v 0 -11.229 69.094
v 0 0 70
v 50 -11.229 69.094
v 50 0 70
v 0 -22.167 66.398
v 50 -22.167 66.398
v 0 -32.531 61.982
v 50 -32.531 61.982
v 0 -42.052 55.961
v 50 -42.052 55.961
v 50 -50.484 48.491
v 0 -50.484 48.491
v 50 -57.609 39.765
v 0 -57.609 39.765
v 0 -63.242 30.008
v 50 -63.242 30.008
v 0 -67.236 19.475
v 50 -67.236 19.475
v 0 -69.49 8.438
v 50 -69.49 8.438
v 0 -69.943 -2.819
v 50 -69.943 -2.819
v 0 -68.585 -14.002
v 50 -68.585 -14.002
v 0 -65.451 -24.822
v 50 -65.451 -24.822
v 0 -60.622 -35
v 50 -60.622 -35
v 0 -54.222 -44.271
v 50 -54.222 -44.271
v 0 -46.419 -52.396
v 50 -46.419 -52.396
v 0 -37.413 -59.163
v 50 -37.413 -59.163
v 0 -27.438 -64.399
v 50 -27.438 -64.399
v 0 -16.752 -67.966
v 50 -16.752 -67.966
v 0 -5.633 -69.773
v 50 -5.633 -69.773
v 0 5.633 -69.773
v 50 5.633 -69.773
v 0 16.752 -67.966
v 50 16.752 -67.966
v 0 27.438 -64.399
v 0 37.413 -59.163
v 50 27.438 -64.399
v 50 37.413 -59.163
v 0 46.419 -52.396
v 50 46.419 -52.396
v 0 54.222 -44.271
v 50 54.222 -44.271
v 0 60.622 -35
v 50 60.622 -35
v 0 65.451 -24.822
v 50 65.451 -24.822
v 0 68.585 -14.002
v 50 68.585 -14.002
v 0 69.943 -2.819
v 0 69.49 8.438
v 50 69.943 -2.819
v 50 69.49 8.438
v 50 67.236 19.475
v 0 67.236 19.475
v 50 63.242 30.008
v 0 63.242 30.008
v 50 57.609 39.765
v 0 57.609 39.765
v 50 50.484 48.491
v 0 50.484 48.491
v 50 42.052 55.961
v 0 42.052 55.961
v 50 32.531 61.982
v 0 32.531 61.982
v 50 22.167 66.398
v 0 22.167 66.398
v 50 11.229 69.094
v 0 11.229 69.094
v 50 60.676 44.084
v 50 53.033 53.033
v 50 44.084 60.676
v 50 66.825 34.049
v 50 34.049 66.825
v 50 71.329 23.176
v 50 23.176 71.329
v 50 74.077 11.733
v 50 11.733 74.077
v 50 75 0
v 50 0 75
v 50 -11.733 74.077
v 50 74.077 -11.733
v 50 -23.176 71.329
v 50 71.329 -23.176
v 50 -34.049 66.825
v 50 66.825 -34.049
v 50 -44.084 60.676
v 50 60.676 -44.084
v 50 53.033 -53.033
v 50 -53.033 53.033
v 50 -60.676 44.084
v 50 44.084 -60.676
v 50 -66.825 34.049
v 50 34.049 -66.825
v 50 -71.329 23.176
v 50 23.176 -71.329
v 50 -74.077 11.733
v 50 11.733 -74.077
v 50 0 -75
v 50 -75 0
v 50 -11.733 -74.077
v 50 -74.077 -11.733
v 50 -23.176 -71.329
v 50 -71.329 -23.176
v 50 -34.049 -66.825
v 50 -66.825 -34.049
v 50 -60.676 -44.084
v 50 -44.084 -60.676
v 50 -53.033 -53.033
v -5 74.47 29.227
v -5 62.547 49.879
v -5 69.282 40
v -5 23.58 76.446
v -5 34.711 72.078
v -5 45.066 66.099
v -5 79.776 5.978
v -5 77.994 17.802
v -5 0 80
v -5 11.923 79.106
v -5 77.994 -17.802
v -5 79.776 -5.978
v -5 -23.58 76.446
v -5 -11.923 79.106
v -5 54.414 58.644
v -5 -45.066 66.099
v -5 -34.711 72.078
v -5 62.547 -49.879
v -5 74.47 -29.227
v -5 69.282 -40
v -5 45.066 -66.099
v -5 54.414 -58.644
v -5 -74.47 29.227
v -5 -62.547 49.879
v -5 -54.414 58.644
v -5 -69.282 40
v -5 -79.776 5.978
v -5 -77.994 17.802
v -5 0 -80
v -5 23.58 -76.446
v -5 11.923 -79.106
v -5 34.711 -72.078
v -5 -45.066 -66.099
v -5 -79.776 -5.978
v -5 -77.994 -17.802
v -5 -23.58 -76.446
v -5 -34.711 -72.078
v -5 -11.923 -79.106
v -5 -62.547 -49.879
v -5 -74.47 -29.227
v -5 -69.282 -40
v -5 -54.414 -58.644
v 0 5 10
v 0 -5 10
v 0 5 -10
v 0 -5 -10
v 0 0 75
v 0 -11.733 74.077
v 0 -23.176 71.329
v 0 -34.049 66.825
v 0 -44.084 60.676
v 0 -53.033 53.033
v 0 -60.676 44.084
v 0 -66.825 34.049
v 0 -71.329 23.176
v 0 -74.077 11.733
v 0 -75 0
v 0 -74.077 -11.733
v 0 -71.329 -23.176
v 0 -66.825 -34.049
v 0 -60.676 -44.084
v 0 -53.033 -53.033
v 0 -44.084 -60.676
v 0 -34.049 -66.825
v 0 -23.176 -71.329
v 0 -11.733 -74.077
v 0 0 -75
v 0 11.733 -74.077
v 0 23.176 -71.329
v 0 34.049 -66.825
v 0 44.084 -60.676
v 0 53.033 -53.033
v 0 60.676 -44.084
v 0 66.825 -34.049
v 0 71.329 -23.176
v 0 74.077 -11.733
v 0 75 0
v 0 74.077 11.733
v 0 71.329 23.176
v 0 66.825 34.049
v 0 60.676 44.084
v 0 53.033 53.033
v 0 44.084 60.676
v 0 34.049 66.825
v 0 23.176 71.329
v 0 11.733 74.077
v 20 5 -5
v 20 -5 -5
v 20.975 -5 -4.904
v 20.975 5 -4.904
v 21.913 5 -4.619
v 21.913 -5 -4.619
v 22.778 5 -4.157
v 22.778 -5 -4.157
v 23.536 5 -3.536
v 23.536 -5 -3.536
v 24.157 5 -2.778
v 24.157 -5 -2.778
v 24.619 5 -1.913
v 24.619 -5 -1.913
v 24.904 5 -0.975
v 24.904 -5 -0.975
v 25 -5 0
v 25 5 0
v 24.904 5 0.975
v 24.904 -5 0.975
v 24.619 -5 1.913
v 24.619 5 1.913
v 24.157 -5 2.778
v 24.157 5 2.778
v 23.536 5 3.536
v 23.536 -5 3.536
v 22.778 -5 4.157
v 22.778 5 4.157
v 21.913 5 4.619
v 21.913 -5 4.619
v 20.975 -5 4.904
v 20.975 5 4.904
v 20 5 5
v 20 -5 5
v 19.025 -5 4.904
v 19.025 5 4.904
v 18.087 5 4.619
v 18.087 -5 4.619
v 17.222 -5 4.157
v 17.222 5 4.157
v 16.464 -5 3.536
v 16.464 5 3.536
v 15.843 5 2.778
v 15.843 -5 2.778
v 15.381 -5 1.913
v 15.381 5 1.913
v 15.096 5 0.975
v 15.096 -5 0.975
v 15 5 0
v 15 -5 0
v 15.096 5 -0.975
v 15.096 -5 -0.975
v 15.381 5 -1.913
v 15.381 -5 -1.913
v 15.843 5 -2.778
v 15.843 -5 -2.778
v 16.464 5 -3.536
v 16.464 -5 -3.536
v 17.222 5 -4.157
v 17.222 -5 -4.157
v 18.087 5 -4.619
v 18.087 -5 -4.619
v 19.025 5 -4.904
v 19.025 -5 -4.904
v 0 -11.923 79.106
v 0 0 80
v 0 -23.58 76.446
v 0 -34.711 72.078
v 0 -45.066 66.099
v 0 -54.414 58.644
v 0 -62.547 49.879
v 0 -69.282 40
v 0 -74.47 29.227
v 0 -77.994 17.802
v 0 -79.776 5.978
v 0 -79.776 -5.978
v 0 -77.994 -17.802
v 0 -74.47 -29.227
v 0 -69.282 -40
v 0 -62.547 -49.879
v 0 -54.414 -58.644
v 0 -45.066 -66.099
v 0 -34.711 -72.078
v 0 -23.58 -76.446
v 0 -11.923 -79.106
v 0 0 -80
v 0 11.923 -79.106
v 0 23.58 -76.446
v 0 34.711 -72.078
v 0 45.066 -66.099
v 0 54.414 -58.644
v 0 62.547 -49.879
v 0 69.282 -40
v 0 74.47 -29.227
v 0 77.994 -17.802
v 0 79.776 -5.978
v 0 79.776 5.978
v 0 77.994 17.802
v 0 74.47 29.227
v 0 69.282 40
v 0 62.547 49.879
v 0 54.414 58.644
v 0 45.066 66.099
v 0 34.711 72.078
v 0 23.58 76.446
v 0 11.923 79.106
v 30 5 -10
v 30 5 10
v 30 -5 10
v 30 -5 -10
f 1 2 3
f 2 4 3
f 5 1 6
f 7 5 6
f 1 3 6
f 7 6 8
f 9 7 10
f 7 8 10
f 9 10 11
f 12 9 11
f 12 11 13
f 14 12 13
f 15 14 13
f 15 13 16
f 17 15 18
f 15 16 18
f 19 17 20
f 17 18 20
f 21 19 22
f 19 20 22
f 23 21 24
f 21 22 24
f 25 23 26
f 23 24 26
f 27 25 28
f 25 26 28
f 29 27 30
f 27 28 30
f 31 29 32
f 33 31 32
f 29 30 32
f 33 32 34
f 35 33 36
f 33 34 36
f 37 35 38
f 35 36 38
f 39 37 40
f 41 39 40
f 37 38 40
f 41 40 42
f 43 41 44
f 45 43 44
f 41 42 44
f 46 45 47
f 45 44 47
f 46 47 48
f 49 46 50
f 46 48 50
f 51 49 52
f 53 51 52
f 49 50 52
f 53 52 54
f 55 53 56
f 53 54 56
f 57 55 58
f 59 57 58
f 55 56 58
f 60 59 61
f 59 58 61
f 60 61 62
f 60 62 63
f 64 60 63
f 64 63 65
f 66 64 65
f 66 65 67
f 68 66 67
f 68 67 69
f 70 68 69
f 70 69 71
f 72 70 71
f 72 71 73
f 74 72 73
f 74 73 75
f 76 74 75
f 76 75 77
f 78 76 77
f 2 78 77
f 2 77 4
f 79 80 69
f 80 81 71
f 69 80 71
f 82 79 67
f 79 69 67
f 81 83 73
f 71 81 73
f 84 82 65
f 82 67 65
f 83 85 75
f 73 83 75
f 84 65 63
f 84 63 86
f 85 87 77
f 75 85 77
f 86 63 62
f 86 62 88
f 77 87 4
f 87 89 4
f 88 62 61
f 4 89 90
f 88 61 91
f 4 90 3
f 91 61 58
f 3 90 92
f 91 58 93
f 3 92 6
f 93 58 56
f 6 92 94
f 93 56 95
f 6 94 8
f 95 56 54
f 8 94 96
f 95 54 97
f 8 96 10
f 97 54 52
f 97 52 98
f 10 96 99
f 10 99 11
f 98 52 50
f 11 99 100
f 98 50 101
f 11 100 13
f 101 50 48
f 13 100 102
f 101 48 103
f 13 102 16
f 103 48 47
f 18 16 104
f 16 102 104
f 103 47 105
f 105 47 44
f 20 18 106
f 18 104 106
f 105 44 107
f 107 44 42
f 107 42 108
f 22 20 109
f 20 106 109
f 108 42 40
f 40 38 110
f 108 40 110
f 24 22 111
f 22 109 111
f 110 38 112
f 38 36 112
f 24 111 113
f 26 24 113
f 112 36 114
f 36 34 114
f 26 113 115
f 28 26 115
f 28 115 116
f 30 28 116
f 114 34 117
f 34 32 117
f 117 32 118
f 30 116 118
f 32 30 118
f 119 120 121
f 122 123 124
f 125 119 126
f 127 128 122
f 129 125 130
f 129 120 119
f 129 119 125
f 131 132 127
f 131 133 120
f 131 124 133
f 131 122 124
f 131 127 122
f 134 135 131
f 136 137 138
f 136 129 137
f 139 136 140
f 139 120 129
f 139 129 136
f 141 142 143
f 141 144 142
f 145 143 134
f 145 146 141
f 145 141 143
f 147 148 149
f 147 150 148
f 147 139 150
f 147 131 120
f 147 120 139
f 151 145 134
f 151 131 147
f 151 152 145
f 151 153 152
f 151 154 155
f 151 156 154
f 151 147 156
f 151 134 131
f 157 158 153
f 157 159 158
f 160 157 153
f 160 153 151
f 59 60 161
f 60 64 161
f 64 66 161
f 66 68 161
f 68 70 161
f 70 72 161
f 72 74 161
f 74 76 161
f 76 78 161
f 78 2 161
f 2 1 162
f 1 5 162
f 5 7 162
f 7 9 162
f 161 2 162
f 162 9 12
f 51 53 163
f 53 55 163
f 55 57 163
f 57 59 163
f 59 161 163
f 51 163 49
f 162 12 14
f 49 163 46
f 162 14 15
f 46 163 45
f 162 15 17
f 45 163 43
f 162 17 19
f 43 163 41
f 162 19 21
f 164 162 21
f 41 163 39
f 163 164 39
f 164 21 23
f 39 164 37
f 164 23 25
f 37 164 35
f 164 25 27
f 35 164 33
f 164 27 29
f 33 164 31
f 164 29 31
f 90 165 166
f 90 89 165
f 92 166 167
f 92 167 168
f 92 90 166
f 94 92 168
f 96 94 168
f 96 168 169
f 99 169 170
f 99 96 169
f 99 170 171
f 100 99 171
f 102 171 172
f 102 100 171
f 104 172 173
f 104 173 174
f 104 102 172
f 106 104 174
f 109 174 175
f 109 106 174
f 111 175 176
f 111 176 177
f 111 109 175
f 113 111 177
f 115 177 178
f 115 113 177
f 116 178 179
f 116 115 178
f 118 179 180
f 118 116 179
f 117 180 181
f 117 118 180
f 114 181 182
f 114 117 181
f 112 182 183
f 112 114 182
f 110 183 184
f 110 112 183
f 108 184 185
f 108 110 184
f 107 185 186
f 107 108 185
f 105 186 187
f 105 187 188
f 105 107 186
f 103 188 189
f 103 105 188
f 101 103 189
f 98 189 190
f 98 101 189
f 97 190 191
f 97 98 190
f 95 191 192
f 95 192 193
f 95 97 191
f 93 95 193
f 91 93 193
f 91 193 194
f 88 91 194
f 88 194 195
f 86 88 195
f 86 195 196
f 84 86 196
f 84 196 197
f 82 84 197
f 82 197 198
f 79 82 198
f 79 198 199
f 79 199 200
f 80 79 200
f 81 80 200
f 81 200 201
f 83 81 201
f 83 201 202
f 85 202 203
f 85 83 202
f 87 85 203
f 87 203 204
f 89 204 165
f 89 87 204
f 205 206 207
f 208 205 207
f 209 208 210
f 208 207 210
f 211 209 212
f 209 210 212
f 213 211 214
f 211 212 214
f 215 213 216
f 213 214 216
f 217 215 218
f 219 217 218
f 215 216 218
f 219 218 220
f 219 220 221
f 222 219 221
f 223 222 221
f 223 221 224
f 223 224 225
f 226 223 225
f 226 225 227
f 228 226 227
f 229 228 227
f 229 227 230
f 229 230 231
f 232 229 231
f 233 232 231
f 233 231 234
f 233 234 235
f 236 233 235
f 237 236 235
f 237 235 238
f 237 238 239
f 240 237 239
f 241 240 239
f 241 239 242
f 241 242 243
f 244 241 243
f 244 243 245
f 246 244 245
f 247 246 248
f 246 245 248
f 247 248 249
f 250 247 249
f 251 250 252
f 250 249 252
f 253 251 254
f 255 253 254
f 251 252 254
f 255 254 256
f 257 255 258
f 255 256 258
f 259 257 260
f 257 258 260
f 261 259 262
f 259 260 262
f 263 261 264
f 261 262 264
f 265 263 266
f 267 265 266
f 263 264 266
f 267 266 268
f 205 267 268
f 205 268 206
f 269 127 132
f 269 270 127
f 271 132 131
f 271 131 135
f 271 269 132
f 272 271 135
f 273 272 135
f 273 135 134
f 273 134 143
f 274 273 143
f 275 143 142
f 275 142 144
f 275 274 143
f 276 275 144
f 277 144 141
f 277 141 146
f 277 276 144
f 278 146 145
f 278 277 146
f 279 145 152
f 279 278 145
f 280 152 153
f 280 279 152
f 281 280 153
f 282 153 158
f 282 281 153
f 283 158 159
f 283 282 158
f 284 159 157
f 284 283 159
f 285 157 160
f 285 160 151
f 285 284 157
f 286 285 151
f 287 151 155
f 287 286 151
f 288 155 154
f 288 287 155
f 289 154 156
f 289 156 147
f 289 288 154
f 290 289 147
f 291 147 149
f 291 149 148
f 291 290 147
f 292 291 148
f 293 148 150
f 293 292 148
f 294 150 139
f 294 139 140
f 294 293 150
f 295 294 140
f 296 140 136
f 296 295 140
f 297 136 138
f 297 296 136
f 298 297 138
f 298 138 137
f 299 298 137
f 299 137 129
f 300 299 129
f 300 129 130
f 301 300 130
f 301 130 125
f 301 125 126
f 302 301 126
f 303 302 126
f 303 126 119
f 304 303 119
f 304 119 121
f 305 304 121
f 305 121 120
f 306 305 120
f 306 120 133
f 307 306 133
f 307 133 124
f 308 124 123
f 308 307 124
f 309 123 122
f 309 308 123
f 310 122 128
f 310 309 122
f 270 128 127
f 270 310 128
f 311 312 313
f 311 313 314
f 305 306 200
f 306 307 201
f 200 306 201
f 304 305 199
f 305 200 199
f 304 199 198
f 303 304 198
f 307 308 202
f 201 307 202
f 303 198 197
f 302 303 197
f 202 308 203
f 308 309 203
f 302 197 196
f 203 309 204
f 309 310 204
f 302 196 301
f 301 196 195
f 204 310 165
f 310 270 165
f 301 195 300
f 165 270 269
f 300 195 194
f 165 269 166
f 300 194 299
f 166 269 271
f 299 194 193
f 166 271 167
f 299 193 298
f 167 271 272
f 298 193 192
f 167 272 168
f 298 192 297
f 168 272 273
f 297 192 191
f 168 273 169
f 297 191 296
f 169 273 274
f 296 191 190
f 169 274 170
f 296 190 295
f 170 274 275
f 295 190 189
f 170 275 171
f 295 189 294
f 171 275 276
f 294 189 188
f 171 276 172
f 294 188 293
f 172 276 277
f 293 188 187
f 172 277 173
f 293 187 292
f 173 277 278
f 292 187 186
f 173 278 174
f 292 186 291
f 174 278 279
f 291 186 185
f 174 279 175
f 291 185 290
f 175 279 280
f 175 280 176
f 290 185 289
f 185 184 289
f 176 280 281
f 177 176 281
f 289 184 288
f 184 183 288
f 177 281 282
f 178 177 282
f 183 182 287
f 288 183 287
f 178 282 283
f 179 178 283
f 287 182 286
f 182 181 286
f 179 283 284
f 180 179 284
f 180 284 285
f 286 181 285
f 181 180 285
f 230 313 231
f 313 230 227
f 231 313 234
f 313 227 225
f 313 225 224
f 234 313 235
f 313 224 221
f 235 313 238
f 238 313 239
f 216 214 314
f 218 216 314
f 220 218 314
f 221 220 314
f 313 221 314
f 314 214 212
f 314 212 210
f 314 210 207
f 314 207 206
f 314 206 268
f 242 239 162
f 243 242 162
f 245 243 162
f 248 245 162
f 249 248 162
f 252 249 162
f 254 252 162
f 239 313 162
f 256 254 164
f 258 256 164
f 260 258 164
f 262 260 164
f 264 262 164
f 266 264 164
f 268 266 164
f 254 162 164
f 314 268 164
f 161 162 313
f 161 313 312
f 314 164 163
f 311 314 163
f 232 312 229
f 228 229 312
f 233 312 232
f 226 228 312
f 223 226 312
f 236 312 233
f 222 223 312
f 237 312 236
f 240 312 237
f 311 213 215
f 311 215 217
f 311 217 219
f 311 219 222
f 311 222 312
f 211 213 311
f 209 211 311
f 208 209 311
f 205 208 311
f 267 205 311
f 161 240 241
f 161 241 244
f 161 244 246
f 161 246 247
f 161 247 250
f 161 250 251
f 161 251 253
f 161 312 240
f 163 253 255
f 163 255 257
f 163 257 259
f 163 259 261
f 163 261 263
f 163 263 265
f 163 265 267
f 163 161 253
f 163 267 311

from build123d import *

# Parameters (mm, degrees)
SKIZZE1_W                       = 5
SKIZZE1_H                       = 80
SKIZZE1_W_2                     = 50
SKIZZE1_H_2                     = 5
SKIZZE2_W                       = 20
SKIZZE2_H                       = 10
AUFSATZ_LINEAR_AUSTRAGEN1_DEPTH = 30
SKIZZE3_R                       = 5
SCHNITT_LINEAR_AUSTRAGEN1_DEPTH = 30


with BuildPart() as part:
    # Skizze1 → Rotation1 (revolve)
    with BuildSketch(Plane.XY, mode=Mode.PRIVATE) as rotation1_sk:
        with Locations((-2.5, 40)):
            Rectangle(SKIZZE1_W, SKIZZE1_H)
        with Locations((25, 72.5)):
            Rectangle(SKIZZE1_W_2, SKIZZE1_H_2)
    revolve(rotation1_sk.sketch.rotate(Axis((0, 0, 0), (1, 0, 0)), 90), axis=Axis((0, 0, 0), (1, 0, 0)))

    # Skizze2 → Aufsatz-Linear austragen1 (add)
    with BuildSketch(Plane(origin=(0, 0, 0), x_dir=(0, 0, -1), z_dir=(1, 0, 0))):
        Rectangle(SKIZZE2_W, SKIZZE2_H)
    extrude(amount=AUFSATZ_LINEAR_AUSTRAGEN1_DEPTH)

    # Skizze3 → Schnitt-Linear austragen1 (cut)
    with BuildSketch(Plane.XZ.offset(5)):
        with Locations(Location((20, 0, 0), (0, 0, 270))):
            Circle(SKIZZE3_R)
    extrude(amount=-SCHNITT_LINEAR_AUSTRAGEN1_DEPTH, mode=Mode.SUBTRACT)


solid = part.part
